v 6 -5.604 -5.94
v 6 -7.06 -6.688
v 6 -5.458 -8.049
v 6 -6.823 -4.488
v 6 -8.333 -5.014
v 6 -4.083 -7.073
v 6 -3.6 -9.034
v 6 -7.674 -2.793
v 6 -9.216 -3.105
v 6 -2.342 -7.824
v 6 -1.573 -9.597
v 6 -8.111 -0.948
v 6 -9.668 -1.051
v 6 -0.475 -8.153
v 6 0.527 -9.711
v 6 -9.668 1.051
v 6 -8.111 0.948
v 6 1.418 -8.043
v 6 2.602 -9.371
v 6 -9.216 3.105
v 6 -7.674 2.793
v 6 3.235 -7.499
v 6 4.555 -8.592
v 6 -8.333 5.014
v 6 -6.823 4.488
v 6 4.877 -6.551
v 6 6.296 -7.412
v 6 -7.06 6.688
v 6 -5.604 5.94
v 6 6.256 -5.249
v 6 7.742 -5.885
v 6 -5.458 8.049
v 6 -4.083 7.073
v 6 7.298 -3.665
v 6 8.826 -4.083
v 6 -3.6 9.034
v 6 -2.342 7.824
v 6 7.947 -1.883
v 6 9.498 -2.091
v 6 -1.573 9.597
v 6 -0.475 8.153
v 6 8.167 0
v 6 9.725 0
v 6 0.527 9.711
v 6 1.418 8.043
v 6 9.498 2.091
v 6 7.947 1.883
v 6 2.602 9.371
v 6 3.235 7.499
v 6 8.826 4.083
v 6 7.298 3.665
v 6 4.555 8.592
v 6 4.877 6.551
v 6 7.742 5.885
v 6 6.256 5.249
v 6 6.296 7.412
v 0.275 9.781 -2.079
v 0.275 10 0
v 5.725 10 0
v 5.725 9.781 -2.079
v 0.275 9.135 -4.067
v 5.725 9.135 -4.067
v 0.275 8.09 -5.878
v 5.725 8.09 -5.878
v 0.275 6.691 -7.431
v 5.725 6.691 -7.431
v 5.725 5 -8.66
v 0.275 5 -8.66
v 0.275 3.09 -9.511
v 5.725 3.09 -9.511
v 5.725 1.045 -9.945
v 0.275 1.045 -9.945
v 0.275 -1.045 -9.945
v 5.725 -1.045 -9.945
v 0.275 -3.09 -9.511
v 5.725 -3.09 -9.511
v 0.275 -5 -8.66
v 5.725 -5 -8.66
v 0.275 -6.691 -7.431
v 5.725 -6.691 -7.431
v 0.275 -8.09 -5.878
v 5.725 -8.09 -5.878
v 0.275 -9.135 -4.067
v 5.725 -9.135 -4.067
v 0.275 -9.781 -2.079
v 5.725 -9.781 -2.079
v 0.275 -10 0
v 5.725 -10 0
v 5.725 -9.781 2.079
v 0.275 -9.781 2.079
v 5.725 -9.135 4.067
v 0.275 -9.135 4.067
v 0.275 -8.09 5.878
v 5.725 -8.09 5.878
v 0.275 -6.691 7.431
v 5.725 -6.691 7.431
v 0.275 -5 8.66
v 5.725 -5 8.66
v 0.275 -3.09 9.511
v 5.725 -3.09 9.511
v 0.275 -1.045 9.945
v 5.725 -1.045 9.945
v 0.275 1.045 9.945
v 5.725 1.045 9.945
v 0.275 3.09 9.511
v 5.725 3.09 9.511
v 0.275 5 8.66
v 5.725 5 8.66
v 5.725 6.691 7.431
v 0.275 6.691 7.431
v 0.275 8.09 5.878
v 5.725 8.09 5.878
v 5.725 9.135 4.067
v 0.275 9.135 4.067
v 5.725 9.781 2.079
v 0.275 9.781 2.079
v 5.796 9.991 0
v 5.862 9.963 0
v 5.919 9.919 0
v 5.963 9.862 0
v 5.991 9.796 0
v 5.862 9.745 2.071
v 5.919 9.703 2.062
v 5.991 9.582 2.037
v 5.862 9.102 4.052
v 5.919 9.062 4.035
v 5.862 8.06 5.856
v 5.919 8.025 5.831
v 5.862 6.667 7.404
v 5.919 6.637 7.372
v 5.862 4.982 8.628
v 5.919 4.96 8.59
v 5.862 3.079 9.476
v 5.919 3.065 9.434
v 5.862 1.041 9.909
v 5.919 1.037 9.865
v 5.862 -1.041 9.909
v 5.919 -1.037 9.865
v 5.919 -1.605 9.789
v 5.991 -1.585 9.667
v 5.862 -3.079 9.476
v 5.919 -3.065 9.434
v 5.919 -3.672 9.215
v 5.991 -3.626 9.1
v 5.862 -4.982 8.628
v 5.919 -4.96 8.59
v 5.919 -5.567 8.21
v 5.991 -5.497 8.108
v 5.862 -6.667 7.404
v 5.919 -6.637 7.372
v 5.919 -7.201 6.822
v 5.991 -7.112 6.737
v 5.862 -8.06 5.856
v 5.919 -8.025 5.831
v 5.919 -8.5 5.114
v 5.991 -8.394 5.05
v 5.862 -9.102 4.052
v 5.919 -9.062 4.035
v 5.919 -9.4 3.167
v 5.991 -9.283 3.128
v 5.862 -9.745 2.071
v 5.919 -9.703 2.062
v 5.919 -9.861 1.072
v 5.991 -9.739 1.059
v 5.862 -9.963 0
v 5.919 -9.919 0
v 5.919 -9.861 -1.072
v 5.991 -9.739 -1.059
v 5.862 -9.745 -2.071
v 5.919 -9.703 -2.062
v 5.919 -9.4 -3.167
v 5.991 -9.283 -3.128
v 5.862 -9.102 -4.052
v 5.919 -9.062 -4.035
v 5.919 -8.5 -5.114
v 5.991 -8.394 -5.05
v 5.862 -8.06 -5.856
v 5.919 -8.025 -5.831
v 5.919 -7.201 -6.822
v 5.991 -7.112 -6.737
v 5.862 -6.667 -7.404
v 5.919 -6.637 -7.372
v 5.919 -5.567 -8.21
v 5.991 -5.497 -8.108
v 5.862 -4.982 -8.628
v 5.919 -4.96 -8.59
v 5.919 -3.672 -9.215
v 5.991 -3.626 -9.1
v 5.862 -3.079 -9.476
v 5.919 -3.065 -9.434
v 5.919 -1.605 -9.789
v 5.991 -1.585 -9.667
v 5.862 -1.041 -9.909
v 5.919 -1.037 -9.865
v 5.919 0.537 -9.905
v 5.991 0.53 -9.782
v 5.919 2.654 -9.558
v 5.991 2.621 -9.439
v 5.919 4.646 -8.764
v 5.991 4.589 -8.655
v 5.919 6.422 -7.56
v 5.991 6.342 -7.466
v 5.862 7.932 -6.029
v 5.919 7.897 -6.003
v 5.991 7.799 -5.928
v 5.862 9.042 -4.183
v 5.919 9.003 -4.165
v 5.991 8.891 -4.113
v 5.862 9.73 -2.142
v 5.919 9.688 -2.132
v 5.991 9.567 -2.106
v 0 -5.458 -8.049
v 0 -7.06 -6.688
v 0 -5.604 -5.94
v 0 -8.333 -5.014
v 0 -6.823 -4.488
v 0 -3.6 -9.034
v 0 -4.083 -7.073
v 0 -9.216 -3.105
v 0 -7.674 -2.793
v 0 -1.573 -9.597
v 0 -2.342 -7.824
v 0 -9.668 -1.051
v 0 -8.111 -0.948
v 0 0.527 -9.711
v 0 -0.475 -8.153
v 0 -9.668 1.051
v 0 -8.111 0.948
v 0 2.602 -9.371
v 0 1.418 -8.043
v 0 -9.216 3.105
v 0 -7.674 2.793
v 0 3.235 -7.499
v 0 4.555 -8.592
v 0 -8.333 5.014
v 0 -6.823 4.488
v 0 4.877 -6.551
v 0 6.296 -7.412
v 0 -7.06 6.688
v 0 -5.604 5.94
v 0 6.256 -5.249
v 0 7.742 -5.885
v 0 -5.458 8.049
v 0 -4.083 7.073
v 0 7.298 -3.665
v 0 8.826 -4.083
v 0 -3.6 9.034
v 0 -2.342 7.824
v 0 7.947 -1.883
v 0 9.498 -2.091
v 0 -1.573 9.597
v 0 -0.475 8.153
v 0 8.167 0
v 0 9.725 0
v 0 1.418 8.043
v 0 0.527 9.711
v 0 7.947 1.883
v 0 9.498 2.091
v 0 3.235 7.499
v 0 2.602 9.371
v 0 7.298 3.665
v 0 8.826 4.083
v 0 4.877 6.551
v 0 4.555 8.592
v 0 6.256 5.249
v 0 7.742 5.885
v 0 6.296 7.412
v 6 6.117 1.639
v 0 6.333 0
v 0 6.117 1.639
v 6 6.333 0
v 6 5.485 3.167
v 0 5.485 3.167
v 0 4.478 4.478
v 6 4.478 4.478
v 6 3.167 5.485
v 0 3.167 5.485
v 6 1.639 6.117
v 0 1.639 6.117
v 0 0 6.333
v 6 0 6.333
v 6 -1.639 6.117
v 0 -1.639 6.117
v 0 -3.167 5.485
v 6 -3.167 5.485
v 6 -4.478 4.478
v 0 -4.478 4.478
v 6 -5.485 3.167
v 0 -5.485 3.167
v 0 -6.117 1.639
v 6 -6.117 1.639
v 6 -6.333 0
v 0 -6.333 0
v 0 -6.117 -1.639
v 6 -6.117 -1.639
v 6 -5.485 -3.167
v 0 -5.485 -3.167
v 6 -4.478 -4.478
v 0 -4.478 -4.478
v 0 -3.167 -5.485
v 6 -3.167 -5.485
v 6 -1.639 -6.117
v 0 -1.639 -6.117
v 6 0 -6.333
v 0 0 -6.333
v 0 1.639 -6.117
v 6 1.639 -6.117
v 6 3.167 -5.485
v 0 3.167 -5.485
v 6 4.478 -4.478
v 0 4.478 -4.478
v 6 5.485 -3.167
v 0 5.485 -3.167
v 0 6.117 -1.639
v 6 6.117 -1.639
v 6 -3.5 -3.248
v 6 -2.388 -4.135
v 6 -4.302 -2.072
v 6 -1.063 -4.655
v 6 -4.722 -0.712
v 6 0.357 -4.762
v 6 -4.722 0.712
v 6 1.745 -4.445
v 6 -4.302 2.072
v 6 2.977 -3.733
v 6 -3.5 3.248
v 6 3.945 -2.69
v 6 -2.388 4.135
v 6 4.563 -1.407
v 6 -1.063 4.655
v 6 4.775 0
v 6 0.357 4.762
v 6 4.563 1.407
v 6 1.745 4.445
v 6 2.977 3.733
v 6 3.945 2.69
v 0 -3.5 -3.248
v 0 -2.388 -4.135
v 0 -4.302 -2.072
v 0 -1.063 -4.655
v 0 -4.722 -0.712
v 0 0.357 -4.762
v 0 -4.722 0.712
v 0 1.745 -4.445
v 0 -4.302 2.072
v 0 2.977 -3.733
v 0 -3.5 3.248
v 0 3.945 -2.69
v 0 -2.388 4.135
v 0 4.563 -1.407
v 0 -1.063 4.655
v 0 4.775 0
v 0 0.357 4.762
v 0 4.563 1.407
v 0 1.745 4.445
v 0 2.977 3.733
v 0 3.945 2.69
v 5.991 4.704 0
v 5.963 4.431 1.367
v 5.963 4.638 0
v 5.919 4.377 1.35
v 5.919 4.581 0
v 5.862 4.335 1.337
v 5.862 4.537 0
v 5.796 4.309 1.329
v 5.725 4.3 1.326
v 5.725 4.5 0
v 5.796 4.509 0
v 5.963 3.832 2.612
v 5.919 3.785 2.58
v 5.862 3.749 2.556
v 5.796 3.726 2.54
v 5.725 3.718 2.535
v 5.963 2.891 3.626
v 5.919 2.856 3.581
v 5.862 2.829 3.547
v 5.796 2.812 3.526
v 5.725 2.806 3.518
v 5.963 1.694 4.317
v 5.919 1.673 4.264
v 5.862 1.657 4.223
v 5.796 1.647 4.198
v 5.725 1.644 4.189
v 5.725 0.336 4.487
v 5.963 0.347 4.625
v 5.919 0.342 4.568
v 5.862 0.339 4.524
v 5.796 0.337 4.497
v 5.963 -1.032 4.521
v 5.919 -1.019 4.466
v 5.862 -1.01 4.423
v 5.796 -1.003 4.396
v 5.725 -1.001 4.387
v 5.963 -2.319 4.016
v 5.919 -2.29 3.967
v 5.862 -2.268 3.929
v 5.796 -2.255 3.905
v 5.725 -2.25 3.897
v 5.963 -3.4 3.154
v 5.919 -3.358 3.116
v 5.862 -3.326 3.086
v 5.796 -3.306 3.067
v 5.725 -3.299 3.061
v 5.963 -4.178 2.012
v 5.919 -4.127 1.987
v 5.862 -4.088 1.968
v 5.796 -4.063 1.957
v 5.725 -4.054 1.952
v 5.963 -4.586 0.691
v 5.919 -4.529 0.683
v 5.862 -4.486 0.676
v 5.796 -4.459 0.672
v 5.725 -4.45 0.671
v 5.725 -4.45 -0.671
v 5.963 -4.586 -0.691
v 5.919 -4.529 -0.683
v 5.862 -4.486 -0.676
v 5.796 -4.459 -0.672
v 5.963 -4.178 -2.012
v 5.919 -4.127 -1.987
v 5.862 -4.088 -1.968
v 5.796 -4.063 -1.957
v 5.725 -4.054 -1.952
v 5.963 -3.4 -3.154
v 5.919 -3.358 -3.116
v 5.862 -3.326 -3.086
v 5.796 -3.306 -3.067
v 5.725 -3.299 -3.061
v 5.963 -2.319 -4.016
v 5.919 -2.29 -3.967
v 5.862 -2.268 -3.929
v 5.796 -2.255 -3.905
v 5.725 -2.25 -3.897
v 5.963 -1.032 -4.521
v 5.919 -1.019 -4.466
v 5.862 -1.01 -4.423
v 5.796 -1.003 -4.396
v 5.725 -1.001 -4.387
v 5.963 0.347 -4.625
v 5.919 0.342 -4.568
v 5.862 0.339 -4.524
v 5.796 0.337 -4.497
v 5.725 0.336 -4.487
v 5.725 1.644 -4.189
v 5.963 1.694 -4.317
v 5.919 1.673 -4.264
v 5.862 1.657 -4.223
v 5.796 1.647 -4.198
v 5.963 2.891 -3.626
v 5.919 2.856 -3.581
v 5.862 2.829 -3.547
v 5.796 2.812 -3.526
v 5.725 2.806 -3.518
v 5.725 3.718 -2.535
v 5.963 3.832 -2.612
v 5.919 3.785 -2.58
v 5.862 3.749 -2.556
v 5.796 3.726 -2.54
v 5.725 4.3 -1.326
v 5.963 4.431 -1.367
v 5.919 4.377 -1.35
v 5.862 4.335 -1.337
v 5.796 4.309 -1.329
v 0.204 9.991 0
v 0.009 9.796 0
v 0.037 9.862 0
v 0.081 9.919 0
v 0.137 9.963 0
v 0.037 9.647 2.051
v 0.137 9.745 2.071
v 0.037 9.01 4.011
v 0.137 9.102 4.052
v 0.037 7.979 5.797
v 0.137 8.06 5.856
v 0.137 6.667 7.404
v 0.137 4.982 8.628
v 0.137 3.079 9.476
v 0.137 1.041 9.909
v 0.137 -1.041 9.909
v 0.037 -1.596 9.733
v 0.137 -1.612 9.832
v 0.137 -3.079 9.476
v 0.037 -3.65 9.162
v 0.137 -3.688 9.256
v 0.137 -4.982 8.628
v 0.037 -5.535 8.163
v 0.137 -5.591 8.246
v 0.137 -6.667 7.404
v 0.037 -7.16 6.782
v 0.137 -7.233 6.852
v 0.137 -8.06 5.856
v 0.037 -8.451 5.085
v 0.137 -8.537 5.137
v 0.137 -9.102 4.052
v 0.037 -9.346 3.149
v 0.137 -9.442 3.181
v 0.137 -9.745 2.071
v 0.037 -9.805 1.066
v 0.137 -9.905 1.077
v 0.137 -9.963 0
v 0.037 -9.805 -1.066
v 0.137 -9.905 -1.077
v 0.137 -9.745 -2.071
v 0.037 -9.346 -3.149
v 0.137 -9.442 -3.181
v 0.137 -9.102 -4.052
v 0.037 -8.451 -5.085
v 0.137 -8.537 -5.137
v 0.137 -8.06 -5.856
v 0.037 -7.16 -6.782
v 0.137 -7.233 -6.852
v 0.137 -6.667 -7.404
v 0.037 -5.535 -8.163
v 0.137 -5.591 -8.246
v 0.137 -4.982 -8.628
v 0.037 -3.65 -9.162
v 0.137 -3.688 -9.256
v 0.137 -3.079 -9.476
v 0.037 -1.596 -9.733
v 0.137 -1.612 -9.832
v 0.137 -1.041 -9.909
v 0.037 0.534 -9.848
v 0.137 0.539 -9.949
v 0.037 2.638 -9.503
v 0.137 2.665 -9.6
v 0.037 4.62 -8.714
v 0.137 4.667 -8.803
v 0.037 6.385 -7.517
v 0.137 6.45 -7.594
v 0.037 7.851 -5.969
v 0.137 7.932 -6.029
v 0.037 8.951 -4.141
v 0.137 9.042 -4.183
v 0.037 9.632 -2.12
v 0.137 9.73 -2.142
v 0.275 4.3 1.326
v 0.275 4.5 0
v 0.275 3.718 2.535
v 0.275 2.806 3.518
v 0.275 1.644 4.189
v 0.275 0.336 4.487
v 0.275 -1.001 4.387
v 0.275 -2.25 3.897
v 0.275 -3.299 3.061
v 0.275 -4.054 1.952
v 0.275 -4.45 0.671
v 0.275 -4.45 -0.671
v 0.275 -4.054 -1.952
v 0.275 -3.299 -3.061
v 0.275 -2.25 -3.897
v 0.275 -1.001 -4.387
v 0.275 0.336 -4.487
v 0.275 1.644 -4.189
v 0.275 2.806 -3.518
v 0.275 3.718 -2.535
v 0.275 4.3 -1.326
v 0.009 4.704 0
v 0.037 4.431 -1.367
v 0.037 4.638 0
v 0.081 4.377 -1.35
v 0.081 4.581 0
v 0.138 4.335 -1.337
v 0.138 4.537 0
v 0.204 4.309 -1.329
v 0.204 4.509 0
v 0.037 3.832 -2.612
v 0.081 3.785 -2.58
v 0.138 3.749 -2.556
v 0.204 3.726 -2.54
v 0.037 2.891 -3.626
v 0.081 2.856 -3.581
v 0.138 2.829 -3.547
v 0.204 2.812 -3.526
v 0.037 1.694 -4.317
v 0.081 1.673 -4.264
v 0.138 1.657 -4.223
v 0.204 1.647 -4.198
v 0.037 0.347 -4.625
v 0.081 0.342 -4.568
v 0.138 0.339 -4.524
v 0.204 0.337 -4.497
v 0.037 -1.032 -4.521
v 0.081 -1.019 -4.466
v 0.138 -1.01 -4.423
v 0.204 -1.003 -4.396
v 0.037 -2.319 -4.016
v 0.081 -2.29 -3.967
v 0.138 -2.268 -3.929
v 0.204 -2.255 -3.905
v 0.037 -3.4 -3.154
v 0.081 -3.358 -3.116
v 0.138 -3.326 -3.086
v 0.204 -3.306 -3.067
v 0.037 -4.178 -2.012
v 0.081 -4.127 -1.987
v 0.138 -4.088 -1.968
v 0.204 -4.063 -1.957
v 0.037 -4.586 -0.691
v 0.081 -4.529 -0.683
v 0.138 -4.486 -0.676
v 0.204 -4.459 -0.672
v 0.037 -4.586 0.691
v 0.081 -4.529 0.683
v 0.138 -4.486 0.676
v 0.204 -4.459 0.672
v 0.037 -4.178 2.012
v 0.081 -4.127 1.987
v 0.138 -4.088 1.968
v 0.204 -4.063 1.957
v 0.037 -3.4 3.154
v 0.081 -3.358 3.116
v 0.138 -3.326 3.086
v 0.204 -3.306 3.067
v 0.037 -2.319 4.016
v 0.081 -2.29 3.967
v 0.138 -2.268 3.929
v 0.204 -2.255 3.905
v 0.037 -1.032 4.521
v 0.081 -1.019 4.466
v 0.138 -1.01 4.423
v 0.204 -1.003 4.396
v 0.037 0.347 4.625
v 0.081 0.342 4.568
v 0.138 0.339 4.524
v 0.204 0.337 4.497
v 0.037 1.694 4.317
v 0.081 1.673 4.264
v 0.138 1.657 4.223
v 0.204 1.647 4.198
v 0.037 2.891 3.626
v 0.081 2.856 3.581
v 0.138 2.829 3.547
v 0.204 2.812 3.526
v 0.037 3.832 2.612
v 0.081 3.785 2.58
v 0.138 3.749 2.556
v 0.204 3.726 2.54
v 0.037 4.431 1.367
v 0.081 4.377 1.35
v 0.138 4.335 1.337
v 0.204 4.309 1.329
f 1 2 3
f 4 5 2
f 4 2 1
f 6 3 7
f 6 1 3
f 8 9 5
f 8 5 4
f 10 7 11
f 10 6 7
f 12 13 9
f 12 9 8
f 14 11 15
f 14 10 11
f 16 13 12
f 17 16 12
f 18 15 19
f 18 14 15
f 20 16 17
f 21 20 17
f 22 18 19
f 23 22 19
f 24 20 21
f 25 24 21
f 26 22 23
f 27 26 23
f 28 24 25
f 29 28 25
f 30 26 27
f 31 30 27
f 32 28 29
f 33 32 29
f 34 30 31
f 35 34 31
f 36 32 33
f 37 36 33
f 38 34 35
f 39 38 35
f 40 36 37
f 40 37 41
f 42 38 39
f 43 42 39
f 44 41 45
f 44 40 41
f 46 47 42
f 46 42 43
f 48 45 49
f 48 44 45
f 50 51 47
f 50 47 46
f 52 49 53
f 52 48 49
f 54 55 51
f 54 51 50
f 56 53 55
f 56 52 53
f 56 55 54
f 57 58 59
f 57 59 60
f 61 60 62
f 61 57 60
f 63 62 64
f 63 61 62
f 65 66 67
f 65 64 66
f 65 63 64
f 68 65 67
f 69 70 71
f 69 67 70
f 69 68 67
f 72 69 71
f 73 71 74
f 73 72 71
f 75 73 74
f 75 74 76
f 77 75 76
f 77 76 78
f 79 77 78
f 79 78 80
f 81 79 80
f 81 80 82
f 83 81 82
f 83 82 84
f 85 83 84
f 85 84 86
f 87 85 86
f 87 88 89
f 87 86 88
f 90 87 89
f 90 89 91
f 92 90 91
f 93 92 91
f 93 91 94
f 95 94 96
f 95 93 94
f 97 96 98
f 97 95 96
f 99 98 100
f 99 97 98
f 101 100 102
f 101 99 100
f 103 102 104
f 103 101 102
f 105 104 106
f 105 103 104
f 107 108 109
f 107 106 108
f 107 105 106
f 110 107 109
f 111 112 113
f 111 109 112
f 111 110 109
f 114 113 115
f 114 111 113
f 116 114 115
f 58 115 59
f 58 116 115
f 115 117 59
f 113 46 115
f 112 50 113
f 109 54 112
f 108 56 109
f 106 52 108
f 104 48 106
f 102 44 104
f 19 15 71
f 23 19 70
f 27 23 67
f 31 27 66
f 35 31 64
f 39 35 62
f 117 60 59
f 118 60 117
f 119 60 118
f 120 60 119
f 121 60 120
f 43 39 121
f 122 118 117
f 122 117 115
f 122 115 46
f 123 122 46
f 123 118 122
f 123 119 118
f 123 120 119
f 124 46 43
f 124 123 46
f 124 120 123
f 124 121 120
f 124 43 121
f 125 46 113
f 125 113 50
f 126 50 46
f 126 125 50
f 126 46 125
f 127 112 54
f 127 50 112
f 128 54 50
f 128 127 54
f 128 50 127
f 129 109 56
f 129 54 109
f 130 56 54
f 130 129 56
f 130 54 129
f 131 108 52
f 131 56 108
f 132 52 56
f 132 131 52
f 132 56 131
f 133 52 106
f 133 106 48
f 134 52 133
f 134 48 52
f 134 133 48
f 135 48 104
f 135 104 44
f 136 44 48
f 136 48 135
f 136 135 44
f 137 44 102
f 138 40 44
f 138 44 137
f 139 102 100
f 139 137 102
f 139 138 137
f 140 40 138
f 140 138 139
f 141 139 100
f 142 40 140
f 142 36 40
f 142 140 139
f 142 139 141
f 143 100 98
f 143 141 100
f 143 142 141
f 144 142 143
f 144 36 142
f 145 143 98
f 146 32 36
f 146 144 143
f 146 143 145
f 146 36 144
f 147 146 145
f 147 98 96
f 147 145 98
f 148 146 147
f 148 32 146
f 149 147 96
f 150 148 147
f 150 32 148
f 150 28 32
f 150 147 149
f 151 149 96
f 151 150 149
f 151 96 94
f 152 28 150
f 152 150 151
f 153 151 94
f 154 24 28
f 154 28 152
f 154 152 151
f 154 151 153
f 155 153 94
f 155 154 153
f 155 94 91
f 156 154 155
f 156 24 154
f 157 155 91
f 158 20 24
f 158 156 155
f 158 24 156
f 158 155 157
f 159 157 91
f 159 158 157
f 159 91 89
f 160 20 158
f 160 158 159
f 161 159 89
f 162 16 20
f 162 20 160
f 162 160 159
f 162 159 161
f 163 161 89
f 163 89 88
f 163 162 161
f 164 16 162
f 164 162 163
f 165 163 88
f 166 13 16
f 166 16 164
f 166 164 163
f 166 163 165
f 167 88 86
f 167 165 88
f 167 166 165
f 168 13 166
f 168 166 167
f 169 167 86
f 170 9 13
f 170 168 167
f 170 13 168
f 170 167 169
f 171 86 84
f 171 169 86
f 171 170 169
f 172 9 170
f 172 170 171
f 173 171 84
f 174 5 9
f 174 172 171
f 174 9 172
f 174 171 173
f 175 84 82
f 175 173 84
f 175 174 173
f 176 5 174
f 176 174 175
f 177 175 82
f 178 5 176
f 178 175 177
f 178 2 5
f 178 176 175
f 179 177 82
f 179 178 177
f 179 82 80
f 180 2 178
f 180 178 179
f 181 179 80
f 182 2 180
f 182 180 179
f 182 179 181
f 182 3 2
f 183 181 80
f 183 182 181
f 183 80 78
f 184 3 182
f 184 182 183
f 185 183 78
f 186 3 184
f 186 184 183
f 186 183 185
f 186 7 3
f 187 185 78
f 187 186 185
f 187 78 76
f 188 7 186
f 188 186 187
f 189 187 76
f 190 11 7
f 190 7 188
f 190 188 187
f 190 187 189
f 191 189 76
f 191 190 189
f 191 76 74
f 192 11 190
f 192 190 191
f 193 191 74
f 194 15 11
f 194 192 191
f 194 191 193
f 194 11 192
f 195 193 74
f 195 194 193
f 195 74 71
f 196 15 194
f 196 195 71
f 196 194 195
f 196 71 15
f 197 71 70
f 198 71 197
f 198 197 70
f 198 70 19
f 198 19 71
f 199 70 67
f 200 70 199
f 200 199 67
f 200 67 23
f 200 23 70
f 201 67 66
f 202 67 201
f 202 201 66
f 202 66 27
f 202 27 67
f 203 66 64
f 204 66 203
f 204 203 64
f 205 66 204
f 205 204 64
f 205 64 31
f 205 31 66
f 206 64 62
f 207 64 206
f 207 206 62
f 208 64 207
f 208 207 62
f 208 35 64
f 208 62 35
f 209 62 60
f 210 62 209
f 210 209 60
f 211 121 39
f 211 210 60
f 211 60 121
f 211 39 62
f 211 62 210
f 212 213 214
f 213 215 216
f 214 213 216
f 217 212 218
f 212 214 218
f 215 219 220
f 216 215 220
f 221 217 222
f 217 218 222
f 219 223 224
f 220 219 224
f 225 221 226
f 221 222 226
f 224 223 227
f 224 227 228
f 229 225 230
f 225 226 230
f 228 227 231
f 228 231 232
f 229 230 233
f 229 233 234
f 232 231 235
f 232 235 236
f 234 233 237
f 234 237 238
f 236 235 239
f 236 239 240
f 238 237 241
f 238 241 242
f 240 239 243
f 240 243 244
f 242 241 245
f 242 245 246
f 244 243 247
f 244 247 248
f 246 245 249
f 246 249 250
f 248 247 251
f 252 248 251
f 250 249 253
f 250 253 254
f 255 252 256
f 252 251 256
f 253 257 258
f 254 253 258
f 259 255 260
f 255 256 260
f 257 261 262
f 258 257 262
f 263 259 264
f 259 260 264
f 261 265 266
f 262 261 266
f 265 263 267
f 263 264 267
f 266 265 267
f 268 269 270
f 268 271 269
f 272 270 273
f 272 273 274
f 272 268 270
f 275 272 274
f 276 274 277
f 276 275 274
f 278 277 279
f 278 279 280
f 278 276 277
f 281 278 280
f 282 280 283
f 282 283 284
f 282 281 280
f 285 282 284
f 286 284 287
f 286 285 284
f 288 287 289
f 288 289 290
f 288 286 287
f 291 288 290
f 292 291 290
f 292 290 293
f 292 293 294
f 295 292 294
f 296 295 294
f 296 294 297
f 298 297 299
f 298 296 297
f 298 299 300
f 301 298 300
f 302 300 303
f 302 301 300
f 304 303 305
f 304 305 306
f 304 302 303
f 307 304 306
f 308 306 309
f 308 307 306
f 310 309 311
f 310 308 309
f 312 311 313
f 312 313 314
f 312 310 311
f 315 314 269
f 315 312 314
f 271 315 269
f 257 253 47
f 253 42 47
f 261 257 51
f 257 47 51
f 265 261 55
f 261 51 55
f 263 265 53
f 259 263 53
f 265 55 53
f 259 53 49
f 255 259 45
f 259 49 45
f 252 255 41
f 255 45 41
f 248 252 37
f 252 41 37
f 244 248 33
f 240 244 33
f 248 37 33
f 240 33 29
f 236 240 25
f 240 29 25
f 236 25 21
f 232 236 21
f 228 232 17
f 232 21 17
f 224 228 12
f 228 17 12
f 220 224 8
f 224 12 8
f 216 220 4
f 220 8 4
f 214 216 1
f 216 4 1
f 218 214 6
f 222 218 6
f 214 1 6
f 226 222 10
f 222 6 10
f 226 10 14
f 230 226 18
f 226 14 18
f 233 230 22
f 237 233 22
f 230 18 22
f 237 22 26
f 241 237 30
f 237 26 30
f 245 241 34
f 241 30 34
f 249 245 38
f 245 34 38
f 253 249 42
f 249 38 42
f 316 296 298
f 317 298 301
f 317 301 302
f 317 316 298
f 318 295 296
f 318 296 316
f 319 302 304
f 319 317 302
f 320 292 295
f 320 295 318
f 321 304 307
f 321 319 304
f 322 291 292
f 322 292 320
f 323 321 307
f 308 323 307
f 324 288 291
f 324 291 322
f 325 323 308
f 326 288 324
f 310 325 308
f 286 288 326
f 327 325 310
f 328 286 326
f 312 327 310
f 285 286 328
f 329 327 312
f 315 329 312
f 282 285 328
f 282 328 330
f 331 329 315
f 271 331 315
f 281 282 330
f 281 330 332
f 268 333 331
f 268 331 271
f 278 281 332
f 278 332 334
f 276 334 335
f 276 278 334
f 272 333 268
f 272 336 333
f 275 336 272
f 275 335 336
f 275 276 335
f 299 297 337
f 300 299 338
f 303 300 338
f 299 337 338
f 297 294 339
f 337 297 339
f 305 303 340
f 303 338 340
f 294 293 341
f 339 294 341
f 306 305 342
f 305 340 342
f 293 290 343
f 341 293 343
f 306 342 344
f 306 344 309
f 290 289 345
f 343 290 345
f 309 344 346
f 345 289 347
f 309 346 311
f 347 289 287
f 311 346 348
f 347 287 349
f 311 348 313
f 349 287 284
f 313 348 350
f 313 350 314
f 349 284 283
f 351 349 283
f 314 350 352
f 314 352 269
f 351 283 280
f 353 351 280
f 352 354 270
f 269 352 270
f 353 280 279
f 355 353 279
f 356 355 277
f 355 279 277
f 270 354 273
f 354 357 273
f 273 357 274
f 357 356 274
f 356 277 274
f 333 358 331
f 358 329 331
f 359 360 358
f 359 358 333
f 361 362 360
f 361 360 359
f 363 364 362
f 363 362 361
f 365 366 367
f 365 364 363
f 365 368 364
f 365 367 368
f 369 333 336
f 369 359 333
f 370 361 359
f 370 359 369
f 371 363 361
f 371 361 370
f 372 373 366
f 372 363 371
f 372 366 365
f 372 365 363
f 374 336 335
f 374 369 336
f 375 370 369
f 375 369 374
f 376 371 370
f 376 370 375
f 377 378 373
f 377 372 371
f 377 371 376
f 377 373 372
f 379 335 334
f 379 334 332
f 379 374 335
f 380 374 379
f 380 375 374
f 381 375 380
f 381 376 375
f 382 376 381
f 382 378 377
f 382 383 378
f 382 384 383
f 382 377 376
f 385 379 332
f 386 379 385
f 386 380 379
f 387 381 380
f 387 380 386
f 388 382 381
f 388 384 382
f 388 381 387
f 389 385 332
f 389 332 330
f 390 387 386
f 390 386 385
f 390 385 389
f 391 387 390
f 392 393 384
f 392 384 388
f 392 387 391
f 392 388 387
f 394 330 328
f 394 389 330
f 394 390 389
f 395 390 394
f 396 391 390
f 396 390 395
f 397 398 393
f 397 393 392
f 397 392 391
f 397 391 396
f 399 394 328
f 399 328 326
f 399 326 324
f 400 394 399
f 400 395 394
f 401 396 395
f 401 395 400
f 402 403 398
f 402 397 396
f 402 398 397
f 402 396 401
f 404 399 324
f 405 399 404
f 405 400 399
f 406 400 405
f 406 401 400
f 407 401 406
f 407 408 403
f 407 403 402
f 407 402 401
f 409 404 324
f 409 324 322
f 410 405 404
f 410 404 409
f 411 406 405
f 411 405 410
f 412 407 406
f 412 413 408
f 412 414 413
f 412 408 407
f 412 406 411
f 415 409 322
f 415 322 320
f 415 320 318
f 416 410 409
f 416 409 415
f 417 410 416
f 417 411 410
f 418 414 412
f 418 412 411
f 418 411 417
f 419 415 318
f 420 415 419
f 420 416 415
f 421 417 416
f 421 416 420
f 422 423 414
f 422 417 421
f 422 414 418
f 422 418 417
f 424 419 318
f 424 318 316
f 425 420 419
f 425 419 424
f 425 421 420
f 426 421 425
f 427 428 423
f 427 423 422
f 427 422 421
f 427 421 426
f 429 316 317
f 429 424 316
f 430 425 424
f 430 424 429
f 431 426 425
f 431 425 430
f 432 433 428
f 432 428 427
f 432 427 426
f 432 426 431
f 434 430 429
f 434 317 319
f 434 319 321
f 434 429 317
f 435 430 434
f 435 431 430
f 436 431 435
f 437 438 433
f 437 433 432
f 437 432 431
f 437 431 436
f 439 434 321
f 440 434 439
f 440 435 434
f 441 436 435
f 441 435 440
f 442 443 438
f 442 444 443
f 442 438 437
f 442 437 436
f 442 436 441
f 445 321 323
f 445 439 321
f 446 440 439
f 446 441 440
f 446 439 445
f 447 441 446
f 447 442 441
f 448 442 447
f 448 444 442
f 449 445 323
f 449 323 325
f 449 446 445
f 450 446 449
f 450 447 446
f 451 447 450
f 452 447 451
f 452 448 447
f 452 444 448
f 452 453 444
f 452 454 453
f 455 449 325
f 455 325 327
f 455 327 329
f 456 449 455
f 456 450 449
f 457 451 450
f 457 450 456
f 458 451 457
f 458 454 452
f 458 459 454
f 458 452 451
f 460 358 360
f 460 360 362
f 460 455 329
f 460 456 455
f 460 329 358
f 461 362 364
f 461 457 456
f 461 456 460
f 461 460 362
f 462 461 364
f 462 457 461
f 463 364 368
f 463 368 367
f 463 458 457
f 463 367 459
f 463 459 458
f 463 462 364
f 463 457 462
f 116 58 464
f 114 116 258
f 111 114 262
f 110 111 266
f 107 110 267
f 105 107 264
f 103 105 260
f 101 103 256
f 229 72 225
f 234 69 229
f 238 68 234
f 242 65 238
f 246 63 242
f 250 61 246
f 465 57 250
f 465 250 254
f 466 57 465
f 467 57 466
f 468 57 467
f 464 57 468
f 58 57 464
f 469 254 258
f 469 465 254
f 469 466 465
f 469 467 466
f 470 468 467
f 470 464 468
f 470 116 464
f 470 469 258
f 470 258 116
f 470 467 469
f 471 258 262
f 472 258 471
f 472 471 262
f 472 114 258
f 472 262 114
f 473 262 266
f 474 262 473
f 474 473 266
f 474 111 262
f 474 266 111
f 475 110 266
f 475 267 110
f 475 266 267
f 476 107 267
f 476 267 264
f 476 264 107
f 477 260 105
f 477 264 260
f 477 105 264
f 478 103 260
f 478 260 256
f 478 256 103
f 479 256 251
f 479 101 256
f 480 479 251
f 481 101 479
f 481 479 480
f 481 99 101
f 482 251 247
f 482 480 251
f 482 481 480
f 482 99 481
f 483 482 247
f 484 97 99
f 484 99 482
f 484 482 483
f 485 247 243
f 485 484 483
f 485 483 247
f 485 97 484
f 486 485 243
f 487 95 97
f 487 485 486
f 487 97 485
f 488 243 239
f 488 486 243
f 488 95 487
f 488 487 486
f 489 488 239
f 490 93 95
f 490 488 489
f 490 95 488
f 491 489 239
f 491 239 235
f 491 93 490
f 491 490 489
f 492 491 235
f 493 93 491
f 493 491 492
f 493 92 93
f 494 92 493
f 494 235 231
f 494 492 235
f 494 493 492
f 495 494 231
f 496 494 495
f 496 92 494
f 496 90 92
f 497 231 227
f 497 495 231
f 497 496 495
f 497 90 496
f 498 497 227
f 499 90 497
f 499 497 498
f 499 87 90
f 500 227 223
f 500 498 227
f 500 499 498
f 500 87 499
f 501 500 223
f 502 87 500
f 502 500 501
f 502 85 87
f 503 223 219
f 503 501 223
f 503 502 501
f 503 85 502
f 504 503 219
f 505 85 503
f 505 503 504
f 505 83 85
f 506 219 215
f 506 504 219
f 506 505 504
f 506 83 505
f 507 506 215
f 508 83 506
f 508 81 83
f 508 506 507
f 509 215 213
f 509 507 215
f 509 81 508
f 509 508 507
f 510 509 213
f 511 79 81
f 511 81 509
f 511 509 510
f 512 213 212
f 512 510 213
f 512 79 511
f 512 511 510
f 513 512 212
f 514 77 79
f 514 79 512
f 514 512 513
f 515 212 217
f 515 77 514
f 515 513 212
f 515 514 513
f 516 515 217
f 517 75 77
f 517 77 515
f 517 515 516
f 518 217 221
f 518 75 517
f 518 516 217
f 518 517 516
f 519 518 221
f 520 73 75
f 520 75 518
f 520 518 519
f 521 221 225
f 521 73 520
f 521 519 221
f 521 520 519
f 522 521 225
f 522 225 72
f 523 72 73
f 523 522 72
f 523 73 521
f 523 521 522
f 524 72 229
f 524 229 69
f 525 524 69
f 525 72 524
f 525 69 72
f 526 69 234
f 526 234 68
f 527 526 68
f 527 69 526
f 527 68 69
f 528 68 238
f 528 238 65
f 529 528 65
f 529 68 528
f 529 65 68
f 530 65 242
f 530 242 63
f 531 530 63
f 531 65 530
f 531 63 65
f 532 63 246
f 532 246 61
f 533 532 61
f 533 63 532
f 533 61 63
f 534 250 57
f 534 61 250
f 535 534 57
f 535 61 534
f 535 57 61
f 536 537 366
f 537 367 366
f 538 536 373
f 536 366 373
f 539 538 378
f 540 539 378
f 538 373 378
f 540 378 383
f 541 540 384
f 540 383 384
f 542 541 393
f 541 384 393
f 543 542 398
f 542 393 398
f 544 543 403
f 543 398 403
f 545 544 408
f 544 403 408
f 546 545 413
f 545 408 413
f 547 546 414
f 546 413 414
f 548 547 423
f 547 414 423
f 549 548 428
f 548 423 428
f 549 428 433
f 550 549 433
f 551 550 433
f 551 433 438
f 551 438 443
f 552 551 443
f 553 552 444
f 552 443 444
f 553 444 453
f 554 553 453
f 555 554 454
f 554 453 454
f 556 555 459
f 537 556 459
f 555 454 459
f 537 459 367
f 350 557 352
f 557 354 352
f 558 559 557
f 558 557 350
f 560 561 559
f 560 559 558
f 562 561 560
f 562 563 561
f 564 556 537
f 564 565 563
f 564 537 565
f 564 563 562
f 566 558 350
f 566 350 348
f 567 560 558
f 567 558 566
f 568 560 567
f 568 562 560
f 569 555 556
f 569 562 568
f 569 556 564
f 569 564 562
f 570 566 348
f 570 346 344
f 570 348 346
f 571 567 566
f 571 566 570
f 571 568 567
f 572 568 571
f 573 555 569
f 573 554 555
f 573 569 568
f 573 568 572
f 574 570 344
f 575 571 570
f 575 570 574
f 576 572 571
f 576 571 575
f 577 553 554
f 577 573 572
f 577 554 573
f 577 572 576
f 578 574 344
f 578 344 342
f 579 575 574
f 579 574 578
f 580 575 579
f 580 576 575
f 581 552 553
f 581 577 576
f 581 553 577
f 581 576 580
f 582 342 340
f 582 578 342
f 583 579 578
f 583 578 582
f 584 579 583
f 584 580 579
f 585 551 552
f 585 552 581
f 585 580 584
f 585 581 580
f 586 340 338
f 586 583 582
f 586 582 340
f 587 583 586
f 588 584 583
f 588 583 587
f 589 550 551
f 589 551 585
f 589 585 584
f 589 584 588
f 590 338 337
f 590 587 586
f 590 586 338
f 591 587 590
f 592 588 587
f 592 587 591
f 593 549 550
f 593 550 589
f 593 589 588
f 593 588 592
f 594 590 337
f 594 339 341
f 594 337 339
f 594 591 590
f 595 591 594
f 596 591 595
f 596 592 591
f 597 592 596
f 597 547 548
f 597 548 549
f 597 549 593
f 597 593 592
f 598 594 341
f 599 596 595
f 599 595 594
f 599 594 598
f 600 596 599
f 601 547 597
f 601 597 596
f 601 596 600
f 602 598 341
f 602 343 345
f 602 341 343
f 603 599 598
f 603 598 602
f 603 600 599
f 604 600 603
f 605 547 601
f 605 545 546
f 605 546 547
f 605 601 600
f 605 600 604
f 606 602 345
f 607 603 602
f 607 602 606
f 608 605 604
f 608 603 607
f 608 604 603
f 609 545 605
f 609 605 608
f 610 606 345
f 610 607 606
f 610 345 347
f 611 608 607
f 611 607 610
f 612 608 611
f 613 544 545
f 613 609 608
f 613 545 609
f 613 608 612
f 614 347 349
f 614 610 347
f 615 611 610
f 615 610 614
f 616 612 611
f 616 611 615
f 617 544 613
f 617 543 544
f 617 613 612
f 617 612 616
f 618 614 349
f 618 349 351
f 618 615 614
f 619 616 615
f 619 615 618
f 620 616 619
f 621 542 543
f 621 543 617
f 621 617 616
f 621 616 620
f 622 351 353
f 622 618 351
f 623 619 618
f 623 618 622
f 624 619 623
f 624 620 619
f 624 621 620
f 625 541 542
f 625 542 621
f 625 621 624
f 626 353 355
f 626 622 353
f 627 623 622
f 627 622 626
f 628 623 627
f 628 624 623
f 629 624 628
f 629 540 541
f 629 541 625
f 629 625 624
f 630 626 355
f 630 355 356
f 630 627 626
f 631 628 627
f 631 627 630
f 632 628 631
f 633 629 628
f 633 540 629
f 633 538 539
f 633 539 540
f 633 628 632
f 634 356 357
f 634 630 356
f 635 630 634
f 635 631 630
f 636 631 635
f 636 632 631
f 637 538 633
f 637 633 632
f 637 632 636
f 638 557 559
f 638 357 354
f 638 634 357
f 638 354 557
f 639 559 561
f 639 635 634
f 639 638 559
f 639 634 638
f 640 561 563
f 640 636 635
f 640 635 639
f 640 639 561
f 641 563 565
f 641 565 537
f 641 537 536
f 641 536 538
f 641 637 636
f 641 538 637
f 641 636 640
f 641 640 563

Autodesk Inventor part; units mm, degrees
ref_plane "YZ Plane" through (0, 0, 0) normal (1, 0, 0) x (0, 1, 0)
ref_plane "XZ Plane" through (0, 0, 0) normal (0, 1, 0) x (-1, 0, 0)
ref_plane "XY Plane" through (0, 0, 0) normal (0, 0, 1) x (1, 0, 0)
sketch "草图" plane through (0, 0, 0) normal (0, 0, 1) x (1, 0, 0)
  line L0 (0, 0) -> (6, 0)
  line L1 (0, 0) -> (0, 4.5) construction
  line L2 (0, 4.5) -> (6, 4.5)
  line L3 (6, 4.5) -> (6, 10)
  line L4 (6, 10) -> (0, 10)
  line L5 (0, 10) -> (0, 4.5)
  line L6 (0, 7.25) -> (6, 7.25)
  line L7 (0, 8.1667) -> (6, 8.1667)
  line L8 (0, 6.3333) -> (6, 6.3333)
  dimension "d0" = 6
  dimension "d1" = 9
  dimension "d2" = 12.6667
  dimension "d3" = 20
revolve "轴承体" add sketch "草图" angle 360 about axis through (0, 0, 0) along (1, 0, 0) contours L5 L8 L3 L2 | L5 L4 L3 L7
fillet "圆角1" radius 0.275 4 edges at (0, -10, 0) (6, -10, 0) (0, -4.5, 0) (6, -4.5, 0)
equation "\"d0\" = KB"
equation "\"d1\" = WD"
equation "\"d2\" = 0.333333 * BD + 0.666667 * WD"
equation "\"d3\" = BD"
equation "\"d5\" = -0.025 * WD + 0.025 * BD"
equation "\"WD\" = 9"
equation "\"BD\" = 20"
equation "\"KB\" = 6"
equation "\"BBA\" = 0"
equation "\"KRS\" = 0.3"
equation "\"KR1S\" = 0.15"
equation "\"WR\" = 0.5 * WD"
properties part number "ISO 1224 - 19 9 x  20 x  6" material "钢，软"
